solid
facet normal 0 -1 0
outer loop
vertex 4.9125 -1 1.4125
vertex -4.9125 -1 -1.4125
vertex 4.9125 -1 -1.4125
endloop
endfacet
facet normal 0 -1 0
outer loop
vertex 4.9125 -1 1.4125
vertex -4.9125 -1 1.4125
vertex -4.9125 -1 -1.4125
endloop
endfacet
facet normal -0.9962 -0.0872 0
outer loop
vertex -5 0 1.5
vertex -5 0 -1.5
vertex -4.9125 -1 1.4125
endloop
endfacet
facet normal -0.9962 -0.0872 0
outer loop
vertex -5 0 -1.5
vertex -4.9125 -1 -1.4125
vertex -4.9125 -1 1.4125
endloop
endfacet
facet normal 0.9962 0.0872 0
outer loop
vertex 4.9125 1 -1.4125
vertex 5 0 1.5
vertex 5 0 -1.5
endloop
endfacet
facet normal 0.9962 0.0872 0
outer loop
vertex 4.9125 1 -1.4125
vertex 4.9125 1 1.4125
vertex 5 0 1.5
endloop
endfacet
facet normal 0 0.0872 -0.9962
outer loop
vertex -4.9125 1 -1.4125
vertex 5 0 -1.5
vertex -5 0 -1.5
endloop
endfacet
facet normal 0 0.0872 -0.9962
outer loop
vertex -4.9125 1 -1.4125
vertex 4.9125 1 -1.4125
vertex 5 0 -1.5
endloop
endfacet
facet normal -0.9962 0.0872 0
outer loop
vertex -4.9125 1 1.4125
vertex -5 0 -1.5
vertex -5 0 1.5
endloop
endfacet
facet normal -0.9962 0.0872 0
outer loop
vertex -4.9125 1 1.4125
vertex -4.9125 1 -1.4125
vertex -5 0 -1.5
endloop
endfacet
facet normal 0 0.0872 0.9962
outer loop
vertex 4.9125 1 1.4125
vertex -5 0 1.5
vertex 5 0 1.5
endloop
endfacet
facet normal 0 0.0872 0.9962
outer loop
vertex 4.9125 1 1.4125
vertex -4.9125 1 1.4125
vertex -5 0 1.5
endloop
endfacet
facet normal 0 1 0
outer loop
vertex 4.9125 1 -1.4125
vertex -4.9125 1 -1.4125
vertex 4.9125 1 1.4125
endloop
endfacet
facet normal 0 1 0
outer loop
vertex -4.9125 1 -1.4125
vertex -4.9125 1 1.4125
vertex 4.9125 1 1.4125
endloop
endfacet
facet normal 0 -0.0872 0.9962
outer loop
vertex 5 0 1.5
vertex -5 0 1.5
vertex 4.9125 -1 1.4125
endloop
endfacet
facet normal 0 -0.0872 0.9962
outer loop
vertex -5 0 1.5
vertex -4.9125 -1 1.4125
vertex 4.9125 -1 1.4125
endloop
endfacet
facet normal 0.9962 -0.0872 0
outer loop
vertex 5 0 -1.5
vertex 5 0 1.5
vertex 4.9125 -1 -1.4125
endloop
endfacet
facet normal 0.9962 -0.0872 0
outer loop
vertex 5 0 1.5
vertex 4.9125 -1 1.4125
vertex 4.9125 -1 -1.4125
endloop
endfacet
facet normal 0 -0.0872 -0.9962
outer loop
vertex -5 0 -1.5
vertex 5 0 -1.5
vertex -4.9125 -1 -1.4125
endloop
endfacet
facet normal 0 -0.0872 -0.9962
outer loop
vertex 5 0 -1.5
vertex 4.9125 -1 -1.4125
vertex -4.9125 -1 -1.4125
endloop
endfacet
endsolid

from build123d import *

# Parameters (mm, degrees)
SKETCH1_W                     = 10
SKETCH1_H                     = 3
BOSS_EXTRUDE1_DEPTH           = 1
BOSS_EXTRUDE1_TAPER           = 5
BOSS_EXTRUDE1_OTHER_WAY_DEPTH = 1
BOSS_EXTRUDE1_OTHER_WAY_TAPER = 5


with BuildPart() as part:
    # Sketch1 → Boss-Extrude1 (new body)
    with BuildSketch(Plane(origin=(0, 0, 0), x_dir=(1, 0, 0), z_dir=(0, 1, 0))):
        Rectangle(SKETCH1_W, SKETCH1_H)
    extrude(amount=BOSS_EXTRUDE1_DEPTH, taper=BOSS_EXTRUDE1_TAPER)

    # Sketch1 → Boss-Extrude1 other way (add)
    with BuildSketch(Plane(origin=(0, 0, 0), x_dir=(1, 0, 0), z_dir=(0, 1, 0))):
        Rectangle(SKETCH1_W, SKETCH1_H)
    extrude(amount=-BOSS_EXTRUDE1_OTHER_WAY_DEPTH, taper=BOSS_EXTRUDE1_OTHER_WAY_TAPER)


solid = part.part
